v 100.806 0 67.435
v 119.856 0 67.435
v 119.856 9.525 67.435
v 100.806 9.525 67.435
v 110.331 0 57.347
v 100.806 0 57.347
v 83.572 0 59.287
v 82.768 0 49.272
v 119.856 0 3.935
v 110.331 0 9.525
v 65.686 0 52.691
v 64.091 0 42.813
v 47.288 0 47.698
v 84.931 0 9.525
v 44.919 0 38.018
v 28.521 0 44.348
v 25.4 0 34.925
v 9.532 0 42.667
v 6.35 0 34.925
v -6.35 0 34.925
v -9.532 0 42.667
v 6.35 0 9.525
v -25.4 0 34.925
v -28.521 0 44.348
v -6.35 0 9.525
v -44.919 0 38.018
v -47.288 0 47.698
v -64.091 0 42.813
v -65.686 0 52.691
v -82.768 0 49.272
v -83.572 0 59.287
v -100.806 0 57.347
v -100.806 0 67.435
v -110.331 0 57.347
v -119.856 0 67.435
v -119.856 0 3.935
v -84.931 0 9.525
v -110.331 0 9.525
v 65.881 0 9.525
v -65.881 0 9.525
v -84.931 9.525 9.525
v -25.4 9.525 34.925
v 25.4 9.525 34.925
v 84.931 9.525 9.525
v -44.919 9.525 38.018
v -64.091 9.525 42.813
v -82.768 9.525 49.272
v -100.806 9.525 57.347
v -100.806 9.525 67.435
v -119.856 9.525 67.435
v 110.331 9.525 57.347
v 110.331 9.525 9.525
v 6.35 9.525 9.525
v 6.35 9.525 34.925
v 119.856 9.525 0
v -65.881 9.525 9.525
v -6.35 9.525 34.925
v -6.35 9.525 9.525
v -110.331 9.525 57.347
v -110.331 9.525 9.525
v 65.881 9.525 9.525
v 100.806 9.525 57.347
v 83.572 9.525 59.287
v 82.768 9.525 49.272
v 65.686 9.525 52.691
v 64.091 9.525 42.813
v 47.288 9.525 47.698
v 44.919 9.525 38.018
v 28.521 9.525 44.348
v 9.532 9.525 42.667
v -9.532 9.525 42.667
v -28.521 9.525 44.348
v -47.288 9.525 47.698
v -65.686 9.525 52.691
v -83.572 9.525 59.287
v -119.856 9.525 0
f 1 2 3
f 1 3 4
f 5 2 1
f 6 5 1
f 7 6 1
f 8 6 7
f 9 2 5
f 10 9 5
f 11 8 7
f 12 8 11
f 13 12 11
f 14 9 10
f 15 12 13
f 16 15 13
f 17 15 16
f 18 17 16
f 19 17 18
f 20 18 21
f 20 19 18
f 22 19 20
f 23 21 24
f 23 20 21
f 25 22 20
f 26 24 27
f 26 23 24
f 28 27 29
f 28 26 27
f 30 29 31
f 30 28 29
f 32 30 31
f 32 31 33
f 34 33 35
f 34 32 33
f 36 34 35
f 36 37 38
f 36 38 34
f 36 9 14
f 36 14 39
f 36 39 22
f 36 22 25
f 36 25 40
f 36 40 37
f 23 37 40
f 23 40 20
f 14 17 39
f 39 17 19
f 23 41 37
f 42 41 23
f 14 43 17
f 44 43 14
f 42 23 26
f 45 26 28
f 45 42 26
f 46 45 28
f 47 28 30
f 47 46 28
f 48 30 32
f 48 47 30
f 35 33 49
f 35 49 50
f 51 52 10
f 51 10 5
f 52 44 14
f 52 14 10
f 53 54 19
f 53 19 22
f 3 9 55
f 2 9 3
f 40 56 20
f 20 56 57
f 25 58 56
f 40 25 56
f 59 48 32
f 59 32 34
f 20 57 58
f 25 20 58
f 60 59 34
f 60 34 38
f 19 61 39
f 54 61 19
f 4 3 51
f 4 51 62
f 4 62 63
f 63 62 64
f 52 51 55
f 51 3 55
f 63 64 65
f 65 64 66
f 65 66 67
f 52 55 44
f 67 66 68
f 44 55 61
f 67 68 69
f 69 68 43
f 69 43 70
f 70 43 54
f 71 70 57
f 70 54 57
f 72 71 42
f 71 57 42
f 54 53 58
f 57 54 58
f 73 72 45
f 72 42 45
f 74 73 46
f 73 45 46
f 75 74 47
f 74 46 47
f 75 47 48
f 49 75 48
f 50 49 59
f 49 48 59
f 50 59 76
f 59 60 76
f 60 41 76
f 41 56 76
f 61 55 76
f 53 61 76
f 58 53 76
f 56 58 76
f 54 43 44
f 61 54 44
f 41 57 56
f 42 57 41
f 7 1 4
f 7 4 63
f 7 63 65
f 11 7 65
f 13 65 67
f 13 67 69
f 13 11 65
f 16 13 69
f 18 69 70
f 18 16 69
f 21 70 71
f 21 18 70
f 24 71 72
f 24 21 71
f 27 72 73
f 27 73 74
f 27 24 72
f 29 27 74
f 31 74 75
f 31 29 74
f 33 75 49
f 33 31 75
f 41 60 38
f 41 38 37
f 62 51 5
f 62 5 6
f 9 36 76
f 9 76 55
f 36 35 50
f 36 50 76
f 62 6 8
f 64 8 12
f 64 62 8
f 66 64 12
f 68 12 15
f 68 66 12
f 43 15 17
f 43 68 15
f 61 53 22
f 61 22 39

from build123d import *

# Parameters (mm, degrees)
BOSS_EXTRUDE1_DEPTH = 9.525
CHAMFER1_SIZE2      = 3.93484735
CHAMFER1_SIZE       = 9.525
CUT_EXTRUDE1_DEPTH  = 138.853926046


with BuildPart() as part:
    # Sketch1 → Boss-Extrude1 (new body)
    with BuildSketch(Plane(origin=(0, 0, 0), x_dir=(1, 0, 0), z_dir=(0, 1, 0))):
        with BuildLine():
            Line((-119.85625, 0), (119.85625, 0))
            Line((119.85625, 0), (119.85625, -67.43484735))
            Line((119.85625, -67.43484735), (100.80625, -67.43484735))
            ThreePointArc((100.80625, -67.43484735), (0, -42.456061365), (-100.80625, -67.43484735))
            Line((-100.80625, -67.43484735), (-119.85625, -67.43484735))
            Line((-119.85625, -67.43484735), (-119.85625, 0))
        make_face()
    extrude(amount=BOSS_EXTRUDE1_DEPTH)

    # Chamfer1
    chamfer1_edges = [part.edges().sort_by_distance(p)[0] for p in [
        (0, 0, 0),
    ]]
    chamfer1_side = [part.faces().sort_by_distance(p)[0] for p in [
        (0, 0.078696947, 0),
    ]]
    chamfer(chamfer1_edges, length=CHAMFER1_SIZE - 0.0001, length2=CHAMFER1_SIZE2 - 0.0001, reference=chamfer1_side[0])  # a hair under: the kernel refuses the full size

    # Sketch3 → Cut-Extrude1 (cut, through all)
    with BuildSketch(Plane(origin=(0, 9.525, 0), x_dir=(1, 0, 0), z_dir=(0, 1, 0))):
        with BuildLine():
            Line((-110.33125, -57.346859726), (-110.33125, -9.525))
            Line((-110.33125, -9.525), (-84.93125, -9.525))
            Line((-84.93125, -9.525), (-25.4, -34.925))
            ThreePointArc((-25.4, -34.925), (-64.091257853, -42.812771399), (-100.80625, -57.346859726))
            Line((-100.80625, -57.346859726), (-110.33125, -57.346859726))
        make_face()
        Polygon((-65.88125, -9.525), (-6.35, -34.925), (-6.35, -9.525), align=None)
        with BuildLine():
            Line((110.33125, -57.346859726), (100.80625, -57.346859726))
            ThreePointArc((100.80625, -57.346859726), (64.091257853, -42.812771399), (25.4, -34.925))
            Line((25.4, -34.925), (84.93125, -9.525))
            Line((84.93125, -9.525), (110.33125, -9.525))
            Line((110.33125, -9.525), (110.33125, -57.346859726))
        make_face()
        Polygon((6.35, -9.525), (65.88125, -9.525), (6.35, -34.925), align=None)
    extrude(amount=-CUT_EXTRUDE1_DEPTH, mode=Mode.SUBTRACT)


solid = part.part
